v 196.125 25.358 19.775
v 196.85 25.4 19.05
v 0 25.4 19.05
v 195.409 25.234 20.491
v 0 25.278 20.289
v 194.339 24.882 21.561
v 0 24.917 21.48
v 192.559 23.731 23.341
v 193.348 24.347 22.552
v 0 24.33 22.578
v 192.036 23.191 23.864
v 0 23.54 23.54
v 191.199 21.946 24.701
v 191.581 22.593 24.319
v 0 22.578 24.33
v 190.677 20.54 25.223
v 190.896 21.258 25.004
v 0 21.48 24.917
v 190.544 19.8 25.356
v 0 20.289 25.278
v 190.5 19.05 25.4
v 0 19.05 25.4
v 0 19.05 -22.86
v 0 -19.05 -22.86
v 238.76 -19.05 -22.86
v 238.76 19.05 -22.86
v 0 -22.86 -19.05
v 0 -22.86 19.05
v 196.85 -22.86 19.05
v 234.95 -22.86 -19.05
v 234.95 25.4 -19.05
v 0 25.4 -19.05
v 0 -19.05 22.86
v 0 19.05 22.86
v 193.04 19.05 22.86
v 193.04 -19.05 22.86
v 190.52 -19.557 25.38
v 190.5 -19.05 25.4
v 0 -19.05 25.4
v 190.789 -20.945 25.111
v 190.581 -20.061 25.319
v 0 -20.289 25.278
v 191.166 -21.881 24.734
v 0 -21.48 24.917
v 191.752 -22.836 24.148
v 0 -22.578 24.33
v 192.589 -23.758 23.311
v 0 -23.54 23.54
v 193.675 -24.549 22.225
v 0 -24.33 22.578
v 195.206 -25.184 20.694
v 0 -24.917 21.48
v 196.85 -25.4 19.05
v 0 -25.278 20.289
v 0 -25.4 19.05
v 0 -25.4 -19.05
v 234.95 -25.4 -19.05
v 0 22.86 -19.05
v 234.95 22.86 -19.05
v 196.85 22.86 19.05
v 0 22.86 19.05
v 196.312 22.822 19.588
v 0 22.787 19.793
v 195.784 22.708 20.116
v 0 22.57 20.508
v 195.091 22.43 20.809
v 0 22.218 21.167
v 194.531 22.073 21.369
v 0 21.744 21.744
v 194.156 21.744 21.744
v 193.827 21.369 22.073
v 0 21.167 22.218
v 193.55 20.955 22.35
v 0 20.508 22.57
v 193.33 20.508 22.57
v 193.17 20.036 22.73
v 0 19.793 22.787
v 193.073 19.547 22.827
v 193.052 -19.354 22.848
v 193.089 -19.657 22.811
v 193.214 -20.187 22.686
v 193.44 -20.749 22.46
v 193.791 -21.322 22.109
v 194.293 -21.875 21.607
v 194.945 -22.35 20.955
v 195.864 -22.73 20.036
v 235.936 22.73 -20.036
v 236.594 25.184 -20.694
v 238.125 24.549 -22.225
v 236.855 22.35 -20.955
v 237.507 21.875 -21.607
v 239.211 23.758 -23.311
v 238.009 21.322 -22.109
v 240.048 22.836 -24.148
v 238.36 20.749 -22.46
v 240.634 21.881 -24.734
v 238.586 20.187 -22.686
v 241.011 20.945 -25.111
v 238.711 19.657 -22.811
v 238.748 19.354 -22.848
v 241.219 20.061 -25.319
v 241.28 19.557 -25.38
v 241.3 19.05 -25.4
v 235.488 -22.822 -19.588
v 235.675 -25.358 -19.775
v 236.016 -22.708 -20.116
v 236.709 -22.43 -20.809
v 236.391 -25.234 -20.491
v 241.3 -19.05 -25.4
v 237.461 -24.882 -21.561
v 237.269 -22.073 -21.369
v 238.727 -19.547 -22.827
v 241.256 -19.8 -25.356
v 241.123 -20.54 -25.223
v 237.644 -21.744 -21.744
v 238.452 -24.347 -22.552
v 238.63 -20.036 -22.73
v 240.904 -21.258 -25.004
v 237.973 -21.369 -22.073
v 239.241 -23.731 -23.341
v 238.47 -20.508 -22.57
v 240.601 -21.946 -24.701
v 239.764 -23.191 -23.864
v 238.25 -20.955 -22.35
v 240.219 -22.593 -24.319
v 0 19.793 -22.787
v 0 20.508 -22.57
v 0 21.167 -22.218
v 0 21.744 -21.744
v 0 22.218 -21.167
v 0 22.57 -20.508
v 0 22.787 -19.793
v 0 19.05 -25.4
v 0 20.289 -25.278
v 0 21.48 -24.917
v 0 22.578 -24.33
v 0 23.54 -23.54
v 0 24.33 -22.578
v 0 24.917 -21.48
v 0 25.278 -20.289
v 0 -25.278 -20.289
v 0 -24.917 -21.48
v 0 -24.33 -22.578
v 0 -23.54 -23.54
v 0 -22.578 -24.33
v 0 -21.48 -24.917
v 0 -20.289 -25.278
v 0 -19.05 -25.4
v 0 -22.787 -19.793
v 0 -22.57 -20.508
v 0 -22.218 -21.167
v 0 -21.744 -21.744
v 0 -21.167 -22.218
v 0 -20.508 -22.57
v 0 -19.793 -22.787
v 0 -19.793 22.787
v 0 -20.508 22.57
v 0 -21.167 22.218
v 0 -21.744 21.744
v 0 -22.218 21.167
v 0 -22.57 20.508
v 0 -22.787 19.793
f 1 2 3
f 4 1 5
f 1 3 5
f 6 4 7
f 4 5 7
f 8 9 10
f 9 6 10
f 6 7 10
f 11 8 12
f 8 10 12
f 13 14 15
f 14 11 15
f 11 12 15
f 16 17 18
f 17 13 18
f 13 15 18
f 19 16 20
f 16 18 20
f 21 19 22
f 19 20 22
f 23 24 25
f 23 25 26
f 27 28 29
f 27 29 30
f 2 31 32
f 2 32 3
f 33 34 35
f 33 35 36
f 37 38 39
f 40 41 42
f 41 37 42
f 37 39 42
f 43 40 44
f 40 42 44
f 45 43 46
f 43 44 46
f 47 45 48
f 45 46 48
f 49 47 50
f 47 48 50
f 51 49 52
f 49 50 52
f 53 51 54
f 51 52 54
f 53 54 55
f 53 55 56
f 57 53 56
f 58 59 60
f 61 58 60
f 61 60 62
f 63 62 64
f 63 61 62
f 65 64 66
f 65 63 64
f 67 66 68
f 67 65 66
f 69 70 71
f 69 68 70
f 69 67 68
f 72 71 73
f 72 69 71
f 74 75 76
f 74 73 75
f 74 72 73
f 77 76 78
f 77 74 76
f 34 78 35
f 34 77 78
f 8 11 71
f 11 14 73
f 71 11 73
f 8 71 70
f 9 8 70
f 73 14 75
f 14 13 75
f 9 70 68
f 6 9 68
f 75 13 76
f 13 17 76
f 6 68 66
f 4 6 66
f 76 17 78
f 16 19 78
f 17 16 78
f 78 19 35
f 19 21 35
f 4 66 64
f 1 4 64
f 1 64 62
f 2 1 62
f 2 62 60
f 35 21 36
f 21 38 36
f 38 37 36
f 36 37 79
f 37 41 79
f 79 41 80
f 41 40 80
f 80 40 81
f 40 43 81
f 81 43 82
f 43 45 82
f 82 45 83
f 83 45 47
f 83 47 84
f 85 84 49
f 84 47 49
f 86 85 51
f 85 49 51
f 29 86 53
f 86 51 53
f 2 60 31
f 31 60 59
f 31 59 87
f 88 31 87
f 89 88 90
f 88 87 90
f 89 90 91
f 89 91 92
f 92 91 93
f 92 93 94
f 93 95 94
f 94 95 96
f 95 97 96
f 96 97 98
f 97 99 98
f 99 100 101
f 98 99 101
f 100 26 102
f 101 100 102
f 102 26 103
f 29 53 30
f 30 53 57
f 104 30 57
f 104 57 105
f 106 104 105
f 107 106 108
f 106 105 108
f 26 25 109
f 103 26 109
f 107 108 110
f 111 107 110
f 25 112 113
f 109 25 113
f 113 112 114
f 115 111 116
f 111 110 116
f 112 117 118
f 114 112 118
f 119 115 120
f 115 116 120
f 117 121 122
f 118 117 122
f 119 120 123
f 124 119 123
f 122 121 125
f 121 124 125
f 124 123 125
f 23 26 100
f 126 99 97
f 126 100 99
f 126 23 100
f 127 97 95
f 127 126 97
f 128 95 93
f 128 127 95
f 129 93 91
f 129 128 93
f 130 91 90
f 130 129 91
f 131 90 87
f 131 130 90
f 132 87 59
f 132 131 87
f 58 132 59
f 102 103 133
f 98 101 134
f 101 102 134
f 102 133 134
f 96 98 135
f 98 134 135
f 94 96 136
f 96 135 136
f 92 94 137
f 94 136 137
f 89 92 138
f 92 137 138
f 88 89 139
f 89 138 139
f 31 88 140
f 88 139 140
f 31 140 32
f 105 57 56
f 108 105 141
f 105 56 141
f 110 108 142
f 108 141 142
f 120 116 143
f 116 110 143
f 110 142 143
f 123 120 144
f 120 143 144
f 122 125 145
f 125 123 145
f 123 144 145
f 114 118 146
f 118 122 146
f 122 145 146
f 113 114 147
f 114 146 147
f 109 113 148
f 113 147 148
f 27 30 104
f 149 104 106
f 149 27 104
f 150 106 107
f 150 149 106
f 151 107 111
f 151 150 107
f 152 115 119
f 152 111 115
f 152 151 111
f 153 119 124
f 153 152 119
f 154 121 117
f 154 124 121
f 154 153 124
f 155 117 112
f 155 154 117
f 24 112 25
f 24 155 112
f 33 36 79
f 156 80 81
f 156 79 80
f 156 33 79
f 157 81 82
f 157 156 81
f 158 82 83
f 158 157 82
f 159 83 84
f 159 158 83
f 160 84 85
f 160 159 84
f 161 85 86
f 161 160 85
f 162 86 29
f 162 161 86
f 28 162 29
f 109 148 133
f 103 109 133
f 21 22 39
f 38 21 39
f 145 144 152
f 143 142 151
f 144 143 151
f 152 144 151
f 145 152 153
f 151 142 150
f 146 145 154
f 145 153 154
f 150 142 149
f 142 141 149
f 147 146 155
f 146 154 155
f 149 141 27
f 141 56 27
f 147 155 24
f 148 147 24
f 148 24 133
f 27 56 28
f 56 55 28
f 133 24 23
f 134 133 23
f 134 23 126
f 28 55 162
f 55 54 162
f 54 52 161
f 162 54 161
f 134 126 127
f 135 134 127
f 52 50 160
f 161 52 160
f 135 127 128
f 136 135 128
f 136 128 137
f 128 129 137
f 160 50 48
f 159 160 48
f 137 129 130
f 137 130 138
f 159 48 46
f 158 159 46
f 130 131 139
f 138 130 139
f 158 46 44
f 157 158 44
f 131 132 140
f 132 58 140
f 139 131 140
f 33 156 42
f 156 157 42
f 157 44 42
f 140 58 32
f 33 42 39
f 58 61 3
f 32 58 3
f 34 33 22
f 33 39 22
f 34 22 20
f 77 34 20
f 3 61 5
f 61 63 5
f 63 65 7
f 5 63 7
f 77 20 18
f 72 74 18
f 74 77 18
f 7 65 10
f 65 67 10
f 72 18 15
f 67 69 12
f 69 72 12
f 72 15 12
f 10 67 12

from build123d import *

# Parameters (mm, degrees)
F1_DEPTH = 254
F2_T     = -2.54
F4_DEPTH = 25.4


with BuildPart() as f1:
    # F0 (on Right) → F1 (new body)
    with BuildSketch(Plane.YZ):
        with BuildLine():
            ThreePointArc((25.4, 19.05), (23.540128, 23.540128), (19.05, 25.4))
            Line((19.05, 25.4), (-19.05, 25.4))
            ThreePointArc((-19.05, 25.4), (-23.540128, 23.540128), (-25.4, 19.05))
            Line((-25.4, 19.05), (-25.4, -19.05))
            ThreePointArc((-25.4, -19.05), (-23.540128, -23.540128), (-19.05, -25.4))
            Line((-19.05, -25.4), (19.05, -25.4))
            ThreePointArc((19.05, -25.4), (23.540128, -23.540128), (25.4, -19.05))
            Line((25.4, -19.05), (25.4, 19.05))
        make_face()
    extrude(amount=F1_DEPTH)

    # F2
    f2_openings = [f1.faces().sort_by_distance(p)[0] for p in [
        (254, 0, 0),
        (0, 0, 0),
    ]]
    offset(amount=F2_T, openings=f2_openings)

    # F3 (on Front) → F4 (cut, symmetric)
    with BuildSketch(Plane.XZ):
        Polygon((254, 25.4), (190.5, 25.4), (241.3, -25.4), (254, -25.4), align=None)
    extrude(amount=F4_DEPTH, both=True, mode=Mode.SUBTRACT)


solid = f1.part
